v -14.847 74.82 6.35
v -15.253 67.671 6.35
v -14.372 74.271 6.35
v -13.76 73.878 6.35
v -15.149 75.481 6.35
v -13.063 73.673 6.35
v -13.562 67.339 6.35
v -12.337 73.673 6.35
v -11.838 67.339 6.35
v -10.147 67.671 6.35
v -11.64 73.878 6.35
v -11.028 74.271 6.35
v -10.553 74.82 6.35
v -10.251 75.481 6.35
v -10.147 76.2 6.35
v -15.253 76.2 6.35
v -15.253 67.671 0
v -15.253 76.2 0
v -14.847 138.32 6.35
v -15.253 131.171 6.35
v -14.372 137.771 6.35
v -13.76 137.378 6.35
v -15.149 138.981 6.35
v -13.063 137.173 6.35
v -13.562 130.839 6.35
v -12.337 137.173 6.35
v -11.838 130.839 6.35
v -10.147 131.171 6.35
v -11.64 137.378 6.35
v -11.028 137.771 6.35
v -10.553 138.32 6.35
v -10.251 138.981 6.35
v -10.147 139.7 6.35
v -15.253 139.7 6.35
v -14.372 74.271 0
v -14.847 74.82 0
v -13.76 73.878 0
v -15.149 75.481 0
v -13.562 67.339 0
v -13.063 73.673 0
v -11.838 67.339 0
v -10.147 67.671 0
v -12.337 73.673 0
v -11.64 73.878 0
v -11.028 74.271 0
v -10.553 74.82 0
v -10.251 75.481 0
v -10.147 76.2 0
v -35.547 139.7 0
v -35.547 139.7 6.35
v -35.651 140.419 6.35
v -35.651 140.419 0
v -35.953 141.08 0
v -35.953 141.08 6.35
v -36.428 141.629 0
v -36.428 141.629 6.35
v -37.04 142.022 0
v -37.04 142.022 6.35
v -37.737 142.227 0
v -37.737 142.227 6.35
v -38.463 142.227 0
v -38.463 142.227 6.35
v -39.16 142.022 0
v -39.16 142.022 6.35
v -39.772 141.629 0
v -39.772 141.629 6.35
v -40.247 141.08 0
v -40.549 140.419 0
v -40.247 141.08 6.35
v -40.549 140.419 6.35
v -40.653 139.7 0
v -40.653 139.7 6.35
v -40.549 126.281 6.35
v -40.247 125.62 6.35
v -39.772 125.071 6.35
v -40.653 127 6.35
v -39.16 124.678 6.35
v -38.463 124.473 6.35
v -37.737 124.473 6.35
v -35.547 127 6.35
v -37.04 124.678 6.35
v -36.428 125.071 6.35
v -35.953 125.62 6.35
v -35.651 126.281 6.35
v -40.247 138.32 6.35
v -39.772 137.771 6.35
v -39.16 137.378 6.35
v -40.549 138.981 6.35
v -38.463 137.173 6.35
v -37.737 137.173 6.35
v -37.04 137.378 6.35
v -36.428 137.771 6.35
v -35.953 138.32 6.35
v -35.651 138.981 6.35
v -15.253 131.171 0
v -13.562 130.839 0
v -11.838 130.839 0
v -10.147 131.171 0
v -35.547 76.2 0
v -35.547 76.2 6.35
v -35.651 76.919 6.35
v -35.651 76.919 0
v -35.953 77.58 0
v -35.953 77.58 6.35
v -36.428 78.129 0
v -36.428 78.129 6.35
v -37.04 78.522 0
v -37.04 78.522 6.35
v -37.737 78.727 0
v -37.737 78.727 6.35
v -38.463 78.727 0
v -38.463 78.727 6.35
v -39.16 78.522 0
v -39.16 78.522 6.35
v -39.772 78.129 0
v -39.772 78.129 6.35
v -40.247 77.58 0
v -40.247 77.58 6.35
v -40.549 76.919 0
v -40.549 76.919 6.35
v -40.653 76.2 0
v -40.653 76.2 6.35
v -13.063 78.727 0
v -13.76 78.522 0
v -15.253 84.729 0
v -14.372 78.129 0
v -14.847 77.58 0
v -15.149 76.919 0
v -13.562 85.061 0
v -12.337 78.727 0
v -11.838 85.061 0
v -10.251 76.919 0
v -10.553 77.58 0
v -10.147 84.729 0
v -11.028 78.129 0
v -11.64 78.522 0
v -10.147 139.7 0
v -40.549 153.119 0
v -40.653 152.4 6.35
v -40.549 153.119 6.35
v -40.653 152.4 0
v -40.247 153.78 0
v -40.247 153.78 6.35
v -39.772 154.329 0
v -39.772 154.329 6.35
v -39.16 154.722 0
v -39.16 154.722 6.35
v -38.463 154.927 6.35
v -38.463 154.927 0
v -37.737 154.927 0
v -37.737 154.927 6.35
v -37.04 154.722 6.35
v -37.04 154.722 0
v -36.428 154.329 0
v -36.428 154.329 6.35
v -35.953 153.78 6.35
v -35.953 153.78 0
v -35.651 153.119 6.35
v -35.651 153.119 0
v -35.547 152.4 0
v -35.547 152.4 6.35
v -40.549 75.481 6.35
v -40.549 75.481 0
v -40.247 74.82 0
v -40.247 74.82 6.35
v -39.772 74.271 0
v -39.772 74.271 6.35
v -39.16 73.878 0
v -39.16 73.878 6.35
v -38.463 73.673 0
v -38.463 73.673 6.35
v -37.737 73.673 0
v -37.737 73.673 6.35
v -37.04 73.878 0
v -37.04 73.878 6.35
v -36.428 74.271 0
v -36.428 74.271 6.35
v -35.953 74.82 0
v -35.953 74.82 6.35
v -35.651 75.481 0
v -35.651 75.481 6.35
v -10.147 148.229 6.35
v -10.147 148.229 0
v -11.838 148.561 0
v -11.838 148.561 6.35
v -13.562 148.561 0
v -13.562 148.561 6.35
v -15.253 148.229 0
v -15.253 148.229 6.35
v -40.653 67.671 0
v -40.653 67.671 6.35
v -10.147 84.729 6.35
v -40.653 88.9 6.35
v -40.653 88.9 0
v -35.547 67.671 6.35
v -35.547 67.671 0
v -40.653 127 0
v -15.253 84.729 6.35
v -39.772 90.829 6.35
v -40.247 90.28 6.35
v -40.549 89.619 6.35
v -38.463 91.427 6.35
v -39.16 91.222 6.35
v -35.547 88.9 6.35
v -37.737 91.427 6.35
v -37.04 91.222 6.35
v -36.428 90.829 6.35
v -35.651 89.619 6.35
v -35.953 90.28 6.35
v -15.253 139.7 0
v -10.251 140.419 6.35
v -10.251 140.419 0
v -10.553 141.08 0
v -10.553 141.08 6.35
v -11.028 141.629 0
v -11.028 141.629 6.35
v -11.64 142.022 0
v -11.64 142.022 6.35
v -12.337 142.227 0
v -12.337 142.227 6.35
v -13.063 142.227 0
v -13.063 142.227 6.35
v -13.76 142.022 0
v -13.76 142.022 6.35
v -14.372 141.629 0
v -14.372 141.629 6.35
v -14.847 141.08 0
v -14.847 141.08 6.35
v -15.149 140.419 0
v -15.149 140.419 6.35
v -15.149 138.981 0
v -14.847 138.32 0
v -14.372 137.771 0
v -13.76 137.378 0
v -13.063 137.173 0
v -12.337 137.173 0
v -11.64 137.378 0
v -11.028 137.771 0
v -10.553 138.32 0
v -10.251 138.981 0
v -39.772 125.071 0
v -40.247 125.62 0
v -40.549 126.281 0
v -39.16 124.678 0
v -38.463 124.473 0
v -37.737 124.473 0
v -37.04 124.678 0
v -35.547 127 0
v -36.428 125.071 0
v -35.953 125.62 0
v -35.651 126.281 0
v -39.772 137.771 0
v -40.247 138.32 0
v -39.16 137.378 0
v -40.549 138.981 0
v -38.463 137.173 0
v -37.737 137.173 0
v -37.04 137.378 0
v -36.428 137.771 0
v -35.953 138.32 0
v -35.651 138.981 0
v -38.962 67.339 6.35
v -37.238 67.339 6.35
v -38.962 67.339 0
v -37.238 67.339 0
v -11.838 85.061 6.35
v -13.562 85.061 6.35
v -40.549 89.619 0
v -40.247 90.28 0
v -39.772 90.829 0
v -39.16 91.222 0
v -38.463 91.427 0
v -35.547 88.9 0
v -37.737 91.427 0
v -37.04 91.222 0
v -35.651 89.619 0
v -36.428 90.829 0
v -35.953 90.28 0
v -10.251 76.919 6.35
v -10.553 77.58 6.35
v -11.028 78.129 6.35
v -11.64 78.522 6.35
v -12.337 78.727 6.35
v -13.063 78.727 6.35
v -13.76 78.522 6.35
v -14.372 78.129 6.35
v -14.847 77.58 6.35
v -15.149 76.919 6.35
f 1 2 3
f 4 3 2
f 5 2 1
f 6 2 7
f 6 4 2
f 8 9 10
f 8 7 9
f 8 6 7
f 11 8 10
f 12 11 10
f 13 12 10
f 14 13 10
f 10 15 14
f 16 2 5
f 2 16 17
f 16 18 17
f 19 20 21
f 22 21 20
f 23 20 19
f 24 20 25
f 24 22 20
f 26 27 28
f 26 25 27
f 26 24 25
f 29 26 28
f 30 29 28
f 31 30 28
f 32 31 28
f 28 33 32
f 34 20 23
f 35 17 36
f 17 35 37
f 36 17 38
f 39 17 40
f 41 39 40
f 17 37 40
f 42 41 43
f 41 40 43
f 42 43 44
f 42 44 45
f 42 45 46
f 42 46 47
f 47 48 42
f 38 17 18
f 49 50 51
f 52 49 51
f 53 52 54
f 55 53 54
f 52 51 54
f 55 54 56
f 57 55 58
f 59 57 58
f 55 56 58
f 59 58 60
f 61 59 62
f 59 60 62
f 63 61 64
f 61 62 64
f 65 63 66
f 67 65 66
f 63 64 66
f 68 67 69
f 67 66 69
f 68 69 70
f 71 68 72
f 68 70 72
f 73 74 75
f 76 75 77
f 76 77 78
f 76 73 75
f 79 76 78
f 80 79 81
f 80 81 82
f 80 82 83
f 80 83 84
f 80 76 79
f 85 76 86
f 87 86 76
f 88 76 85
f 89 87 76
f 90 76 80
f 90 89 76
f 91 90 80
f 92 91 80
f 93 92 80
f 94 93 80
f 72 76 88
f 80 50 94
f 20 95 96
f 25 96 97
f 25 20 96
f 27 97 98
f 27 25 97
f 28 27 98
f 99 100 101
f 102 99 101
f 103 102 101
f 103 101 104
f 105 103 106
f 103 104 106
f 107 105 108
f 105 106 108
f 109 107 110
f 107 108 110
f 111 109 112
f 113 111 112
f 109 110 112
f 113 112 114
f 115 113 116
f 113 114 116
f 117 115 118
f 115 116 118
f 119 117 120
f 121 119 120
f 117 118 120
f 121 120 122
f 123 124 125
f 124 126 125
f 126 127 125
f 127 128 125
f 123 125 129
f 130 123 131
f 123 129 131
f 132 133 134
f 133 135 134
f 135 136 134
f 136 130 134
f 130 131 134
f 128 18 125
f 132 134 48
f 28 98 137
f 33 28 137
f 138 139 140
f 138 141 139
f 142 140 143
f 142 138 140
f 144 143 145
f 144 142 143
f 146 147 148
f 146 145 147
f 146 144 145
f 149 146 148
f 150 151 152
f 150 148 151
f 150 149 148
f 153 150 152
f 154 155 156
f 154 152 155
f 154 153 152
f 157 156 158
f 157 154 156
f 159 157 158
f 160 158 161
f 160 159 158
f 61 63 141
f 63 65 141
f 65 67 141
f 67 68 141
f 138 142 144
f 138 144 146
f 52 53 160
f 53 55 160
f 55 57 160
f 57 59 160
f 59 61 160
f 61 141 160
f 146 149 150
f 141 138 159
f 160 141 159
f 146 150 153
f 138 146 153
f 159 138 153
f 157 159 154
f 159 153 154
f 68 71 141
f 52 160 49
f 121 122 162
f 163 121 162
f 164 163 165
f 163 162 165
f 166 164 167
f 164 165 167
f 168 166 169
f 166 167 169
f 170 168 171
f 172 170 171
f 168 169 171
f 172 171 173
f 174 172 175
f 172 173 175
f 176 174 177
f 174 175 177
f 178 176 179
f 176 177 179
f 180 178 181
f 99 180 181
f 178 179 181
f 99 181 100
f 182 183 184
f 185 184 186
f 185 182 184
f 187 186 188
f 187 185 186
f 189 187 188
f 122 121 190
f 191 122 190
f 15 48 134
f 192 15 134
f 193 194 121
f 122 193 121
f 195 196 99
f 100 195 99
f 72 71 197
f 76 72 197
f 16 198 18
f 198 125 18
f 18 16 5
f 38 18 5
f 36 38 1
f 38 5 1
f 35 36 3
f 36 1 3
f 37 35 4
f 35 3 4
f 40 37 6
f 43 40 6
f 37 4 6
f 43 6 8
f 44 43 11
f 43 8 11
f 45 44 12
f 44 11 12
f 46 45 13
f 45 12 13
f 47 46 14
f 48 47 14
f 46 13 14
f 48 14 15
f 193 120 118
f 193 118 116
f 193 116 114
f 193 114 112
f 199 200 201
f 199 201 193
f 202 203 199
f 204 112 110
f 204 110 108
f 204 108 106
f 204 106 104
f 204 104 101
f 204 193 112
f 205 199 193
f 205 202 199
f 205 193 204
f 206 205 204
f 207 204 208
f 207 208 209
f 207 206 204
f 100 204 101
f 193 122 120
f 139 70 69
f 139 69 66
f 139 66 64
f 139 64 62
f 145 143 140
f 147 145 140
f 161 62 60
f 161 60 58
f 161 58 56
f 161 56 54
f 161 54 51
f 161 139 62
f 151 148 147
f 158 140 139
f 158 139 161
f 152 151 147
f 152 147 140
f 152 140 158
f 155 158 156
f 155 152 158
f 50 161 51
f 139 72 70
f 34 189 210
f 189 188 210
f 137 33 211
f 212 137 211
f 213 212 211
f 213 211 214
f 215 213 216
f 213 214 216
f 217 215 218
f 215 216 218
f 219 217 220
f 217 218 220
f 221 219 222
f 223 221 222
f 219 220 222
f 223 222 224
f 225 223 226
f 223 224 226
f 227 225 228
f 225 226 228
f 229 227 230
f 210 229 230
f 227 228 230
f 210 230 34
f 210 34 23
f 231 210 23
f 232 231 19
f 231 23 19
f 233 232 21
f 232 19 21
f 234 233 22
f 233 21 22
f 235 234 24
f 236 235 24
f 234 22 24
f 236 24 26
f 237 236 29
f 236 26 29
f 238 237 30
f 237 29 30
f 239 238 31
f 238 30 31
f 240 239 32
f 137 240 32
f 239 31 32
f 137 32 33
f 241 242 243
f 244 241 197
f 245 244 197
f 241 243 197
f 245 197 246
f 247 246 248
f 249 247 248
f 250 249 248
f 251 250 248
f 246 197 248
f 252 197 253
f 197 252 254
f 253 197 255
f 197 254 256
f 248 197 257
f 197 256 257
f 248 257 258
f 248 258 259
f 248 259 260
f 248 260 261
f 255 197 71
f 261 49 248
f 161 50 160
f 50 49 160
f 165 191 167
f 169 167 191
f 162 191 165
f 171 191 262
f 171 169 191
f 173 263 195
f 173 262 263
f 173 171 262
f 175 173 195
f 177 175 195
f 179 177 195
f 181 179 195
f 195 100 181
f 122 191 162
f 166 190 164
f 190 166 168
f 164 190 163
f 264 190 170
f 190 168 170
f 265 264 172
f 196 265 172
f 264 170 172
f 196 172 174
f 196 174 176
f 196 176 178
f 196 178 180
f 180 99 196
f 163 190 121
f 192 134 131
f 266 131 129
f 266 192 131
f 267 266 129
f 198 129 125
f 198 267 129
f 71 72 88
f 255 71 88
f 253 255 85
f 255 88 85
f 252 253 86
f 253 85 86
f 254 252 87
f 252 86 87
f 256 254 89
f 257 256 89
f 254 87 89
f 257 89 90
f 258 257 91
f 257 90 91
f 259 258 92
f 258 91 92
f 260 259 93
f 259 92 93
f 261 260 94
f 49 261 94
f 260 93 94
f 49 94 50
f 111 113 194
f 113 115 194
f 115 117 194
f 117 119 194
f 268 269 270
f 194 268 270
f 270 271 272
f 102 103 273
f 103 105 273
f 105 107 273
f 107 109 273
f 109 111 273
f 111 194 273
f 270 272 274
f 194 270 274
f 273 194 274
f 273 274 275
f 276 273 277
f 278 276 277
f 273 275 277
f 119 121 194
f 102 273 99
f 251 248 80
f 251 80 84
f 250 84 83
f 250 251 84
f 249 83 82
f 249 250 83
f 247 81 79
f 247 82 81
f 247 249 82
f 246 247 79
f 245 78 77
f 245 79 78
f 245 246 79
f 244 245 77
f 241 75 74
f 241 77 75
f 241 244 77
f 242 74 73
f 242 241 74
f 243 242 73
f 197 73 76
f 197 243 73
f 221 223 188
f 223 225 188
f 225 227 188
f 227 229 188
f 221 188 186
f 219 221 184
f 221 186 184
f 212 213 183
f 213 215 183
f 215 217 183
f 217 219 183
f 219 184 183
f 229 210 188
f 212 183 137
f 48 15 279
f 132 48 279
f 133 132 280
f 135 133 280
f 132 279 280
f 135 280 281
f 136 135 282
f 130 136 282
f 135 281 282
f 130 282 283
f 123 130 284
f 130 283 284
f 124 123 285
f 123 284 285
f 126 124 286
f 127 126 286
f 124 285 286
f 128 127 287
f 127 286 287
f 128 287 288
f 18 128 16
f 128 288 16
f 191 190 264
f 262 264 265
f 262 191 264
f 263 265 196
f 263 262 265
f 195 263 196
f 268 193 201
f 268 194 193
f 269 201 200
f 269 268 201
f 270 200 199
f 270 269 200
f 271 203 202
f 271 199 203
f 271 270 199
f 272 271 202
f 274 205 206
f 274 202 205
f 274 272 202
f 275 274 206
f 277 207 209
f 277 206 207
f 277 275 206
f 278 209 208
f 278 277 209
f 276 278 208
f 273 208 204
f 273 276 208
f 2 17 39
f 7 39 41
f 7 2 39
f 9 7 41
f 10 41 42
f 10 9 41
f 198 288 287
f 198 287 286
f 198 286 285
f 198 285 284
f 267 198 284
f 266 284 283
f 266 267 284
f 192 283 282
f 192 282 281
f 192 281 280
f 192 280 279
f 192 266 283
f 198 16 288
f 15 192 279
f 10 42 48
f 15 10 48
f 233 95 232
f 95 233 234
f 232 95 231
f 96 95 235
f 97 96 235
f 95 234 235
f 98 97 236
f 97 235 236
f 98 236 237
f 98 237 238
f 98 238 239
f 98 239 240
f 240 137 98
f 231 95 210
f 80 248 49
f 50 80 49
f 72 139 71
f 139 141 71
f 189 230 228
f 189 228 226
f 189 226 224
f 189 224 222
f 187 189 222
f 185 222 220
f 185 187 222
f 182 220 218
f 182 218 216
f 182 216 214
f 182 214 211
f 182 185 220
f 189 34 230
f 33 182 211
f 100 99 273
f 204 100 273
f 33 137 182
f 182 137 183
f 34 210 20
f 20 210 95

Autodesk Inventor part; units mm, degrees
ref_plane "YZ Plane" through (0, 0, 0) normal (1, 0, 0) x (0, 1, 0)
ref_plane "XZ Plane" through (0, 0, 0) normal (0, 1, 0) x (-1, 0, 0)
ref_plane "XY Plane" through (0, 0, 0) normal (0, 0, 1) x (1, 0, 0)
sketch "Sketch1" plane through (0, 0, 0) normal (0, 0, 1) x (1, 0, 0)
  line L0 (0, 0) -> (-50.8, 0) construction
  line L1 (-50.8, 0) -> (-50.8, 381) construction
  line L2 (-50.8, 381) -> (0, 381) construction
  line L3 (0, 381) -> (0, 0) construction
  circle A0 centre (-50.8, 431.8) radius 11.1125 construction
  line L4 (-50.8, 353.7099) -> (-298.4703, 0) construction
  line L5 (-298.4703, 0) -> (-267.4626, 0) construction
  line L6 (-267.4626, 0) -> (-50.8, 309.4263) construction
  dimension "d0" = 50.8
  dimension "d1" = 381
  dimension "d2" = 22.225
  dimension "d3" = 431.8
  dimension "d4" = 50.8
  dimension "d5" = 431.8
  dimension "d6" = 25.4
  dimension "d7" = 35
sketch "Sketch2" plane through (0, 0, 0) normal (0, 0, 1) x (1, 0, 0)
  line L0 (-267.4626, 0) -> (-50.8, 309.4263) construction
  line L1 (-50.8, 353.7099) -> (-298.4703, 0) construction
  line L2 (-50.8, 0) -> (-50.8, 381) construction
  line L3 (0, 381) -> (0, 0) construction
  line L4 (-50.8, 381) -> (0, 381) construction
  circle A0 centre (-50.8, 431.8) radius 11.1125 construction
  line L5 (0, 0) -> (-50.8, 0) construction
  line L6 (-298.4703, 0) -> (-267.4626, 0) construction
  circle A1 centre (-88.9, 38.1) radius 30.48 construction
  circle A2 centre (-88.9, 38.1) radius 6.35 construction
  circle A3 centre (-99.4866, 89.0824) radius 45.72 construction
  circle A4 centre (-99.4866, 89.0824) radius 11.43 construction
  circle A5 centre (-157.9039, 88.5265) radius 46.99 construction
  circle A6 centre (-157.9039, 88.5265) radius 12.7 construction
  circle A7 centre (-140.3916, 141.5914) radius 43.18 construction
  circle A8 centre (-99.4866, 89.0824) radius 14.2875
  circle A9 centre (-157.9039, 88.5265) radius 14.2875
  circle A10 centre (-140.3916, 141.5914) radius 14.2875
  circle A11 centre (-50.8, 431.8) radius 54.5719 construction
  line L7 (-50.8, 177.8) -> (0, 177.8)
  circle A12 centre (-140.3916, 141.5914) radius 20.6375 construction
  circle A13 centre (-157.9039, 88.5265) radius 20.6375 construction
  circle A14 centre (-99.4866, 89.0824) radius 20.6375 construction
  circle A15 centre (-88.9, 38.1) radius 25.4 construction
  line L8 (-50.8, 177.8) -> (-143.8598, 161.9354)
  line L9 (-74.6041, 11.1805) -> (0, 50.8)
  line L10 (0, 177.8) -> (0, 50.8)
  arc A16 (-143.8598, 161.9354) -> (-158.347, 131.4176) centre (-140.3916, 141.5914) ccw
  arc A17 (-117.4357, 99.2675) -> (-118.6127, 96.8346) centre (-99.4866, 89.0824) ccw
  arc A18 (-118.8586, 43.7135) -> (-74.6041, 11.1805) centre (-88.9, 38.1) ccw
  line L11 (-38.1, 152.4) -> (-38.1, 127) construction
  line L12 (-40.6527, 152.4) -> (-40.6527, 127)
  line L13 (-35.5473, 127) -> (-35.5473, 152.4)
  arc A19 (-35.5473, 152.4) -> (-40.6527, 152.4) centre (-38.1, 152.4) ccw
  arc A20 (-40.6527, 127) -> (-35.5473, 127) centre (-38.1, 127) ccw
  line L14 (-12.7, 152.4) -> (-12.7, 127) construction
  line L15 (-15.2527, 152.4) -> (-15.2527, 127)
  line L16 (-10.1473, 127) -> (-10.1473, 152.4)
  arc A21 (-10.1473, 152.4) -> (-15.2527, 152.4) centre (-12.7, 152.4) ccw
  arc A22 (-15.2527, 127) -> (-10.1473, 127) centre (-12.7, 127) ccw
  line L17 (-38.1, 139.7) -> (-12.7, 139.7) construction
  line L18 (-38.1, 88.9) -> (-38.1, 63.5) construction
  line L19 (-40.6527, 88.9) -> (-40.6527, 63.5)
  line L20 (-35.5473, 63.5) -> (-35.5473, 88.9)
  arc A23 (-35.5473, 88.9) -> (-40.6527, 88.9) centre (-38.1, 88.9) ccw
  arc A24 (-40.6527, 63.5) -> (-35.5473, 63.5) centre (-38.1, 63.5) ccw
  line L21 (-12.7, 88.9) -> (-12.7, 63.5) construction
  line L22 (-15.2527, 88.9) -> (-15.2527, 63.5)
  line L23 (-10.1473, 63.5) -> (-10.1473, 88.9)
  arc A25 (-10.1473, 88.9) -> (-15.2527, 88.9) centre (-12.7, 88.9) ccw
  arc A26 (-15.2527, 63.5) -> (-10.1473, 63.5) centre (-12.7, 63.5) ccw
  line L24 (-38.1, 76.2) -> (-12.7, 76.2) construction
  circle A27 centre (-88.9, 38.1) radius 10.795
  point P0 (-88.9, 63.5)
  point P1 (-110.897, 50.8)
  point P2 (-110.897, 25.4)
  point P3 (-88.9, 12.7)
  point P4 (-66.903, 25.4)
  point P5 (-66.903, 50.8)
  point P6 (-25.4, 139.7)
  point P7 (-25.4, 177.8)
  point P8 (-25.4, 76.2)
  point P9 (-38.1, 168.275)
  point P10 (-12.7, 168.275)
  dimension "d25" = 50.8
  dimension "d8" = 60.96
  dimension "d9" = 12.7
  dimension "d10" = 91.44
  dimension "d11" = 38.1
  dimension "d12" = 38.1
  dimension "d13" = 22.86
  dimension "d14" = 93.98
  dimension "d15" = 25.4
  dimension "d16" = 86.36
  dimension "d22" = 28.575
  dimension "d23" = 109.1438
  dimension "d24" = 6.35
  dimension "d28" = 360
  dimension "d30" = 177.8
  dimension "d31" = 50.8
  dimension "d32" = 5.1054
  dimension "d33" = 25.4
  dimension "d34" = 38.1
  dimension "d35" = 25.4
  dimension "d36" = 5.1054
  dimension "d37" = 25.4
  dimension "d38" = 25.4
  dimension "d39" = 63.5
  dimension "d42" = 21.59
  dimension "d50" = 9.525
extrude "Extrusion1" add sketch "Sketch2" along normal blind 6.35 contours A19 L13 A20 L12 | A21 L16 A22 L15 | A23 L20 A24 L19 | A25 L23 A26 L22
hole "Hole1" at (-88.9, 63.5, 0) at (-110.897, 50.8, 0) at (-110.897, 25.4, 0) at (-88.9, 12.7, 0) at (-66.903, 25.4, 0) at (-66.903, 50.8, 0) at (-38.1, 139.7, 0) at (-12.7, 139.7, 0) at (-38.1, 76.2, 0) at (-12.7, 76.2, 0) direction (0, 0, 1) diameter 5.1054 end through all clearance for "Flat Head Machine Screw (82)" size "#10" standard "Ansi Unified Screw Threads"
fillet "Fillet1" [suppressed]
hole "Hole2" at (-38.1, 168.275, 0) at (-12.7, 168.275, 0) direction (0, 0, 1) diameter 3.9624 end through all thread size "10-32 UNF" class "2B" standard "ANSI Unified Screw Threads"
sketch "Sketch4" plane through (0, 0, 6.35) normal (0, 0, 1) x (1, 0, 0)
  arc A0 (-35.5473, 76.2) -> (-40.6527, 76.2) centre (-38.1, 76.2) ccw construction
  arc A1 (-35.5473, 139.7) -> (-40.6527, 139.7) centre (-38.1, 139.7) ccw construction
  arc A2 (-10.1473, 139.7) -> (-15.2527, 139.7) centre (-12.7, 139.7) ccw construction
  arc A3 (-10.1473, 76.2) -> (-15.2527, 76.2) centre (-12.7, 76.2) ccw construction
  line L0 (-35.5473, 139.7) -> (-35.5473, 152.4) projected
  arc A4 (-35.5473, 152.4) -> (-40.6527, 152.4) centre (-38.1, 152.4) ccw projected
  line L1 (-40.6527, 152.4) -> (-40.6527, 139.7) projected
  arc A5 (-40.6527, 139.7) -> (-35.5473, 139.7) centre (-38.1, 139.7) ccw projected
  line L2 (-40.6527, 139.7) -> (-40.6527, 127) projected
  arc A6 (-40.6527, 127) -> (-35.5473, 127) centre (-38.1, 127) ccw projected
  line L3 (-35.5473, 127) -> (-35.5473, 139.7) projected
  line L4 (-35.5473, 76.2) -> (-35.5473, 88.9) projected
  arc A7 (-35.5473, 88.9) -> (-40.6527, 88.9) centre (-38.1, 88.9) ccw projected
  line L5 (-40.6527, 88.9) -> (-40.6527, 76.2) projected
  arc A8 (-40.6527, 76.2) -> (-35.5473, 76.2) centre (-38.1, 76.2) ccw projected
  line L6 (-40.6527, 76.2) -> (-40.6527, 63.5) projected
  arc A9 (-40.6527, 63.5) -> (-35.5473, 63.5) centre (-38.1, 63.5) ccw projected
  line L7 (-35.5473, 63.5) -> (-35.5473, 76.2) projected
  line L8 (-10.1473, 139.7) -> (-10.1473, 152.4) projected
  arc A10 (-10.1473, 152.4) -> (-15.2527, 152.4) centre (-12.7, 152.4) ccw projected
  line L9 (-15.2527, 152.4) -> (-15.2527, 139.7) projected
  arc A11 (-15.2527, 139.7) -> (-10.1473, 139.7) centre (-12.7, 139.7) ccw projected
  line L10 (-15.2527, 139.7) -> (-15.2527, 127) projected
  arc A12 (-15.2527, 127) -> (-10.1473, 127) centre (-12.7, 127) ccw projected
  line L11 (-10.1473, 127) -> (-10.1473, 139.7) projected
  line L12 (-10.1473, 76.2) -> (-10.1473, 88.9) projected
  arc A13 (-10.1473, 88.9) -> (-15.2527, 88.9) centre (-12.7, 88.9) ccw projected
  line L13 (-15.2527, 88.9) -> (-15.2527, 76.2) projected
  arc A14 (-15.2527, 76.2) -> (-10.1473, 76.2) centre (-12.7, 76.2) ccw projected
  line L14 (-15.2527, 76.2) -> (-15.2527, 63.5) projected
  arc A15 (-15.2527, 63.5) -> (-10.1473, 63.5) centre (-12.7, 63.5) ccw projected
  line L15 (-10.1473, 63.5) -> (-10.1473, 76.2) projected
  point P0 (0, 0)
  point P1 (-64.4644, 155.575)
hole "Hole3" at (-64.4644, 155.575, 6.35) direction (0, 0, -1) diameter 3.9624 end through all thread size "10-32 UNF" class "2B" standard "ANSI Unified Screw Threads"
sketch "Sketch3" plane through (0, 0, 6.35) normal (0, 0, 1) x (1, 0, 0)
  arc A0 (-35.5473, 76.2) -> (-40.6527, 76.2) centre (-38.1, 76.2) ccw construction
  arc A1 (-35.5473, 139.7) -> (-40.6527, 139.7) centre (-38.1, 139.7) ccw construction
  arc A2 (-10.1473, 139.7) -> (-15.2527, 139.7) centre (-12.7, 139.7) ccw construction
  arc A3 (-10.1473, 76.2) -> (-15.2527, 76.2) centre (-12.7, 76.2) ccw construction
  circle A4 centre (-101.6, 129.9906) radius 20.6375 construction
  arc A5 (-136.4593, 83.8492) -> (-111.3998, 184.5895) centre (-275.3417, 171.8837) ccw construction
  arc A6 (-88.8183, 197.2966) -> (-111.3998, 184.5895) centre (-97.155, 185.6935) ccw construction
  line L0 (-61.7546, 177.8517) -> (-94.3408, 201.2645) construction
  arc A7 (-56.2321, 173.8838) -> (-48.6735, 171.45) centre (-48.6735, 184.404) ccw construction
  line L1 (-48.6735, 171.45) -> (-6.604, 171.45) construction
  arc A8 (-6.35, 171.196) -> (-6.604, 171.45) centre (-6.604, 171.196) ccw
  line L2 (-6.35, 171.196) -> (-6.35, 54.7703) construction
  arc A9 (-6.4849, 54.546) -> (-6.35, 54.7703) centre (-6.604, 54.7703) ccw
  line L3 (-6.4849, 54.546) -> (-77.5824, 16.7888) construction
  arc A10 (-109.3468, 25.2865) -> (-77.5824, 16.7888) centre (-88.9, 38.1) ccw construction
  line L4 (-109.3468, 25.2865) -> (-136.4985, 68.613) construction
  arc A11 (-136.4593, 83.8492) -> (-136.4985, 68.613) centre (-124.3919, 76.2) ccw construction
  circle A12 centre (-97.155, 185.6935) radius 20.6375 construction
  circle A13 centre (-124.3919, 76.2) radius 20.6375 construction
  circle A14 centre (-38.1, 139.7) radius 8.9027 construction
  arc A15 (-10.1473, 139.7) -> (-15.2527, 139.7) centre (-12.7, 139.7) ccw construction
  circle A16 centre (-12.7, 139.7) radius 8.9027 construction
  arc A17 (-10.1473, 76.2) -> (-15.2527, 76.2) centre (-12.7, 76.2) ccw construction
  circle A18 centre (-12.7, 76.2) radius 8.9027 construction
  arc A19 (-35.5473, 76.2) -> (-40.6527, 76.2) centre (-38.1, 76.2) ccw construction
  circle A20 centre (-38.1, 76.2) radius 8.9027 construction
  circle A21 centre (-66.903, 50.8) radius 2.5527 construction
  circle A22 centre (-66.903, 50.8) radius 8.9027 construction
  circle A23 centre (-88.9, 63.5) radius 8.9027 construction
  circle A24 centre (-38.1, 168.275) radius 1.9812 construction
  circle A25 centre (-38.1, 168.275) radius 8.9027 construction
  circle A26 centre (-12.7, 168.275) radius 1.9812 construction
  circle A27 centre (-12.7, 168.275) radius 8.9027 construction
  line L5 (-101.6, 129.9906) -> (-38.1, 139.7) construction
  circle A28 centre (-88.9, 63.5) radius 2.5527 construction
  line L6 (-124.3919, 76.2) -> (-88.9, 63.5) construction
  line L7 (-88.9, 63.5) -> (-66.903, 50.8) construction
  line L8 (-66.903, 50.8) -> (-38.1, 76.2) construction
  arc A29 (-35.5473, 139.7) -> (-40.6527, 139.7) centre (-38.1, 139.7) ccw construction
  line L9 (-38.1, 139.7) -> (-38.1, 76.2) construction
  line L10 (-102.0799, 133.1291) -> (-38.5799, 142.8385) construction
  line L11 (-101.1201, 126.852) -> (-37.6201, 136.5615) construction
  line L12 (-41.275, 139.7) -> (-41.275, 77.6333) construction
  line L13 (-41.275, 77.6333) -> (-67.2915, 54.6905) construction
  line L14 (-67.2915, 54.6905) -> (-87.5606, 66.3929) construction
  line L15 (-87.5606, 66.3929) -> (-123.3222, 79.1894) construction
  line L16 (-34.925, 141.1333) -> (-34.925, 74.7667) construction
  line L17 (-34.925, 74.7667) -> (-66.5144, 46.9095) construction
  line L18 (-66.5144, 46.9095) -> (-90.2394, 60.6071) construction
  line L19 (-90.2394, 60.6071) -> (-125.4616, 73.2106) construction
  line L20 (-38.1, 139.7) -> (-38.1, 168.275) construction
  line L21 (-34.925, 107.95) -> (-6.35, 107.95) construction
  line L22 (-34.925, 111.125) -> (-6.35, 111.125) construction
  line L23 (-34.925, 104.775) -> (-6.35, 104.775) construction
  line L24 (-34.925, 139.7) -> (-34.925, 168.275) construction
  line L25 (-41.275, 139.7) -> (-41.275, 168.275) construction
  line L26 (-76.7242, 188.6072) -> (-56.2321, 173.8838)
  line L27 (-48.6735, 171.45) -> (-46.4173, 171.45)
  line L28 (-29.7827, 171.45) -> (-21.0173, 171.45)
  line L29 (-6.35, 162.0352) -> (-6.35, 145.9398)
  line L30 (-6.35, 133.4602) -> (-6.35, 111.125)
  line L31 (-6.35, 111.125) -> (-34.925, 111.125)
  line L32 (-34.925, 111.125) -> (-34.925, 131.3827)
  line L33 (-34.925, 148.0173) -> (-34.925, 159.9577)
  line L34 (-41.275, 159.9577) -> (-41.275, 148.0173)
  line L35 (-6.35, 104.775) -> (-34.925, 104.775)
  line L36 (-34.925, 104.775) -> (-34.925, 84.5173)
  line L37 (-6.35, 104.775) -> (-6.35, 82.4398)
  line L38 (-6.35, 69.9602) -> (-6.35, 54.7703)
  line L39 (-6.4849, 54.546) -> (-55.1495, 28.702)
  line L40 (-58.5648, 53.9198) -> (-42.2382, 68.3175)
  line L41 (-72.5184, 57.7083) -> (-80.1095, 62.091)
  line L42 (-62.7648, 58.6825) -> (-46.4381, 73.0802)
  line L43 (-95.6614, 69.2915) -> (-104.1226, 72.3192)
  line L44 (-41.275, 84.5173) -> (-41.275, 131.3827)
  line L45 (-45.8418, 135.3043) -> (-80.9626, 129.9342)
  line L46 (-81.9224, 136.2113) -> (-46.8016, 141.5814)
  arc A30 (-110.9157, 170.3133) -> (-76.7242, 188.6072) centre (-97.155, 185.6935) ccw
  arc A31 (-81.9224, 136.2113) -> (-112.7474, 147.3584) centre (-101.6, 129.9906) ccw
  arc A32 (-41.275, 148.0173) -> (-46.8016, 141.5814) centre (-38.1, 139.7) ccw
  arc A33 (-46.4173, 171.45) -> (-41.275, 159.9577) centre (-38.1, 168.275) ccw
  arc A34 (-56.2321, 173.8838) -> (-48.6735, 171.45) centre (-48.6735, 184.404) ccw
  arc A35 (-21.0173, 171.45) -> (-6.35, 162.0352) centre (-12.7, 168.275) ccw
  arc A36 (-6.35, 145.9398) -> (-6.35, 133.4602) centre (-12.7, 139.7) ccw
  arc A37 (-34.925, 131.3827) -> (-34.925, 148.0173) centre (-38.1, 139.7) ccw
  arc A38 (-119.4378, 119.6117) -> (-80.9626, 129.9342) centre (-101.6, 129.9906) ccw
  arc A39 (-104.1226, 72.3192) -> (-129.3429, 96.2348) centre (-124.3919, 76.2) ccw
  arc A40 (-80.1095, 62.091) -> (-95.6614, 69.2915) centre (-88.9, 63.5) ccw
  arc A41 (-62.7648, 58.6825) -> (-72.5184, 57.7083) centre (-66.903, 50.8) ccw
  arc A42 (-41.275, 84.5173) -> (-46.4381, 73.0802) centre (-38.1, 76.2) ccw
  arc A43 (-6.35, 82.4398) -> (-6.35, 69.9602) centre (-12.7, 76.2) ccw
  arc A44 (-62.7274, 42.9373) -> (-58.5648, 53.9198) centre (-66.903, 50.8) ccw
  arc A45 (-42.2382, 68.3175) -> (-34.925, 84.5173) centre (-38.1, 76.2) ccw
  arc A46 (-112.7474, 147.3584) -> (-110.9157, 170.3133) centre (-275.3417, 171.8837) ccw
  arc A47 (-129.3429, 96.2348) -> (-119.4378, 119.6117) centre (-275.3417, 171.8837) ccw
  arc A48 (-34.925, 159.9577) -> (-29.7827, 171.45) centre (-38.1, 168.275) ccw
  arc A49 (-45.8418, 135.3043) -> (-41.275, 131.3827) centre (-38.1, 139.7) ccw
  line L47 (-62.7134, 42.945) -> (-55.1495, 28.702)
  arc A50 (-128.5905, 55.9941) -> (-104.1226, 72.3192) centre (-124.3919, 76.2) ccw
  arc A51 (-129.3429, 96.2348) -> (-128.5905, 55.9941) centre (-124.3919, 76.2) ccw
  circle A52 centre (-64.4644, 155.575) radius 1.9812 construction
  circle A53 centre (-64.4644, 155.575) radius 8.9027 construction
  line L48 (-97.155, 185.6935) -> (-64.4644, 155.575) construction
  line L49 (-64.4644, 155.575) -> (-38.1, 168.275) construction
  line L50 (-95.0037, 188.0285) -> (-63.8992, 159.3714) construction
  line L51 (-63.8992, 159.3714) -> (-39.4779, 171.1354) construction
  line L52 (-36.7221, 165.4146) -> (-65.0295, 151.7786) construction
  line L53 (-65.0295, 151.7786) -> (-99.3063, 183.3585) construction
  line L54 (-84.3092, 169.5413) -> (-72.7326, 158.8756)
  line L55 (-80.0066, 174.2114) -> (-68.43, 163.5457)
  line L56 (-58.349, 162.045) -> (-46.9711, 167.5259)
  line L57 (-44.2153, 161.805) -> (-55.5932, 156.3241)
  arc A54 (-72.7326, 158.8756) -> (-55.5932, 156.3241) centre (-64.4644, 155.575) ccw
  arc A55 (-58.349, 162.045) -> (-68.43, 163.5457) centre (-64.4644, 155.575) ccw
  line L58 (-35.5473, 139.7) -> (-35.5473, 152.4) projected
  arc A56 (-35.5473, 152.4) -> (-40.6527, 152.4) centre (-38.1, 152.4) ccw projected
  line L59 (-40.6527, 152.4) -> (-40.6527, 139.7) projected
  arc A57 (-40.6527, 139.7) -> (-35.5473, 139.7) centre (-38.1, 139.7) ccw projected
  line L60 (-40.6527, 139.7) -> (-40.6527, 127) projected
  arc A58 (-40.6527, 127) -> (-35.5473, 127) centre (-38.1, 127) ccw projected
  line L61 (-35.5473, 127) -> (-35.5473, 139.7) projected
  line L62 (-35.5473, 76.2) -> (-35.5473, 88.9) projected
  arc A59 (-35.5473, 88.9) -> (-40.6527, 88.9) centre (-38.1, 88.9) ccw projected
  line L63 (-40.6527, 88.9) -> (-40.6527, 76.2) projected
  arc A60 (-40.6527, 76.2) -> (-35.5473, 76.2) centre (-38.1, 76.2) ccw projected
  line L64 (-40.6527, 76.2) -> (-40.6527, 63.5) projected
  arc A61 (-40.6527, 63.5) -> (-35.5473, 63.5) centre (-38.1, 63.5) ccw projected
  line L65 (-35.5473, 63.5) -> (-35.5473, 76.2) projected
  line L66 (-10.1473, 139.7) -> (-10.1473, 152.4) projected
  arc A62 (-10.1473, 152.4) -> (-15.2527, 152.4) centre (-12.7, 152.4) ccw projected
  line L67 (-15.2527, 152.4) -> (-15.2527, 139.7) projected
  arc A63 (-15.2527, 139.7) -> (-10.1473, 139.7) centre (-12.7, 139.7) ccw projected
  line L68 (-15.2527, 139.7) -> (-15.2527, 127) projected
  arc A64 (-15.2527, 127) -> (-10.1473, 127) centre (-12.7, 127) ccw projected
  line L69 (-10.1473, 127) -> (-10.1473, 139.7) projected
  line L70 (-10.1473, 76.2) -> (-10.1473, 88.9) projected
  arc A65 (-10.1473, 88.9) -> (-15.2527, 88.9) centre (-12.7, 88.9) ccw projected
  line L71 (-15.2527, 88.9) -> (-15.2527, 76.2) projected
  arc A66 (-15.2527, 76.2) -> (-10.1473, 76.2) centre (-12.7, 76.2) ccw projected
  line L72 (-15.2527, 76.2) -> (-15.2527, 63.5) projected
  arc A67 (-15.2527, 63.5) -> (-10.1473, 63.5) centre (-12.7, 63.5) ccw projected
  line L73 (-10.1473, 63.5) -> (-10.1473, 76.2) projected
  point P0 (0, 0)
  point P1 (-62.7133, 42.9448)
  dimension "d65" = 6.35
  dimension "d66" = 3.175
  dimension "d67" = 3.175
  dimension "d68" = 3.175
  dimension "d69" = 3.175
  dimension "d70" = 63.5
  dimension "d71" = 3.175
  dimension "d72" = 3.175
  dimension "d73" = 3.175
  dimension "d74" = 3.175
  dimension "d75" = 25.4
  dimension "d90" = 3.175
  dimension "d91" = 3.175
extrude "Extrusion2" cut sketch "Sketch3" against normal through all contours L39 L47 A44 L40 A45 L64 A61 L65 L36 L35 L37 A43 L70 A65 L71 L72 A67 L73 L38 A9 | L73 A67 L72 A43 | L71 A65 L70 A43 | A45 L65 A61 L64 | L26 A34 L27 A33 L56 A55 L55 A30 | L55 A55 L56 A33 L57 A54 L54 A30 | L54 A54 L57 A33 L34 A32 L46 A31 A46 A30 | L28 A35 L29 A36 L66 A62 L67 L68 A64 L69 L30 L31 L32 A37 L33 A48 | A36 L67 A62 L66 | A36 L69 A64 L68 | L41 A40 L43 A39 A47 A38 L45 A49 L44 A42 L42 A41
fillet "Fillet2" [suppressed]
properties part number "CL8-GB-001" material "Aluminum 6061"
